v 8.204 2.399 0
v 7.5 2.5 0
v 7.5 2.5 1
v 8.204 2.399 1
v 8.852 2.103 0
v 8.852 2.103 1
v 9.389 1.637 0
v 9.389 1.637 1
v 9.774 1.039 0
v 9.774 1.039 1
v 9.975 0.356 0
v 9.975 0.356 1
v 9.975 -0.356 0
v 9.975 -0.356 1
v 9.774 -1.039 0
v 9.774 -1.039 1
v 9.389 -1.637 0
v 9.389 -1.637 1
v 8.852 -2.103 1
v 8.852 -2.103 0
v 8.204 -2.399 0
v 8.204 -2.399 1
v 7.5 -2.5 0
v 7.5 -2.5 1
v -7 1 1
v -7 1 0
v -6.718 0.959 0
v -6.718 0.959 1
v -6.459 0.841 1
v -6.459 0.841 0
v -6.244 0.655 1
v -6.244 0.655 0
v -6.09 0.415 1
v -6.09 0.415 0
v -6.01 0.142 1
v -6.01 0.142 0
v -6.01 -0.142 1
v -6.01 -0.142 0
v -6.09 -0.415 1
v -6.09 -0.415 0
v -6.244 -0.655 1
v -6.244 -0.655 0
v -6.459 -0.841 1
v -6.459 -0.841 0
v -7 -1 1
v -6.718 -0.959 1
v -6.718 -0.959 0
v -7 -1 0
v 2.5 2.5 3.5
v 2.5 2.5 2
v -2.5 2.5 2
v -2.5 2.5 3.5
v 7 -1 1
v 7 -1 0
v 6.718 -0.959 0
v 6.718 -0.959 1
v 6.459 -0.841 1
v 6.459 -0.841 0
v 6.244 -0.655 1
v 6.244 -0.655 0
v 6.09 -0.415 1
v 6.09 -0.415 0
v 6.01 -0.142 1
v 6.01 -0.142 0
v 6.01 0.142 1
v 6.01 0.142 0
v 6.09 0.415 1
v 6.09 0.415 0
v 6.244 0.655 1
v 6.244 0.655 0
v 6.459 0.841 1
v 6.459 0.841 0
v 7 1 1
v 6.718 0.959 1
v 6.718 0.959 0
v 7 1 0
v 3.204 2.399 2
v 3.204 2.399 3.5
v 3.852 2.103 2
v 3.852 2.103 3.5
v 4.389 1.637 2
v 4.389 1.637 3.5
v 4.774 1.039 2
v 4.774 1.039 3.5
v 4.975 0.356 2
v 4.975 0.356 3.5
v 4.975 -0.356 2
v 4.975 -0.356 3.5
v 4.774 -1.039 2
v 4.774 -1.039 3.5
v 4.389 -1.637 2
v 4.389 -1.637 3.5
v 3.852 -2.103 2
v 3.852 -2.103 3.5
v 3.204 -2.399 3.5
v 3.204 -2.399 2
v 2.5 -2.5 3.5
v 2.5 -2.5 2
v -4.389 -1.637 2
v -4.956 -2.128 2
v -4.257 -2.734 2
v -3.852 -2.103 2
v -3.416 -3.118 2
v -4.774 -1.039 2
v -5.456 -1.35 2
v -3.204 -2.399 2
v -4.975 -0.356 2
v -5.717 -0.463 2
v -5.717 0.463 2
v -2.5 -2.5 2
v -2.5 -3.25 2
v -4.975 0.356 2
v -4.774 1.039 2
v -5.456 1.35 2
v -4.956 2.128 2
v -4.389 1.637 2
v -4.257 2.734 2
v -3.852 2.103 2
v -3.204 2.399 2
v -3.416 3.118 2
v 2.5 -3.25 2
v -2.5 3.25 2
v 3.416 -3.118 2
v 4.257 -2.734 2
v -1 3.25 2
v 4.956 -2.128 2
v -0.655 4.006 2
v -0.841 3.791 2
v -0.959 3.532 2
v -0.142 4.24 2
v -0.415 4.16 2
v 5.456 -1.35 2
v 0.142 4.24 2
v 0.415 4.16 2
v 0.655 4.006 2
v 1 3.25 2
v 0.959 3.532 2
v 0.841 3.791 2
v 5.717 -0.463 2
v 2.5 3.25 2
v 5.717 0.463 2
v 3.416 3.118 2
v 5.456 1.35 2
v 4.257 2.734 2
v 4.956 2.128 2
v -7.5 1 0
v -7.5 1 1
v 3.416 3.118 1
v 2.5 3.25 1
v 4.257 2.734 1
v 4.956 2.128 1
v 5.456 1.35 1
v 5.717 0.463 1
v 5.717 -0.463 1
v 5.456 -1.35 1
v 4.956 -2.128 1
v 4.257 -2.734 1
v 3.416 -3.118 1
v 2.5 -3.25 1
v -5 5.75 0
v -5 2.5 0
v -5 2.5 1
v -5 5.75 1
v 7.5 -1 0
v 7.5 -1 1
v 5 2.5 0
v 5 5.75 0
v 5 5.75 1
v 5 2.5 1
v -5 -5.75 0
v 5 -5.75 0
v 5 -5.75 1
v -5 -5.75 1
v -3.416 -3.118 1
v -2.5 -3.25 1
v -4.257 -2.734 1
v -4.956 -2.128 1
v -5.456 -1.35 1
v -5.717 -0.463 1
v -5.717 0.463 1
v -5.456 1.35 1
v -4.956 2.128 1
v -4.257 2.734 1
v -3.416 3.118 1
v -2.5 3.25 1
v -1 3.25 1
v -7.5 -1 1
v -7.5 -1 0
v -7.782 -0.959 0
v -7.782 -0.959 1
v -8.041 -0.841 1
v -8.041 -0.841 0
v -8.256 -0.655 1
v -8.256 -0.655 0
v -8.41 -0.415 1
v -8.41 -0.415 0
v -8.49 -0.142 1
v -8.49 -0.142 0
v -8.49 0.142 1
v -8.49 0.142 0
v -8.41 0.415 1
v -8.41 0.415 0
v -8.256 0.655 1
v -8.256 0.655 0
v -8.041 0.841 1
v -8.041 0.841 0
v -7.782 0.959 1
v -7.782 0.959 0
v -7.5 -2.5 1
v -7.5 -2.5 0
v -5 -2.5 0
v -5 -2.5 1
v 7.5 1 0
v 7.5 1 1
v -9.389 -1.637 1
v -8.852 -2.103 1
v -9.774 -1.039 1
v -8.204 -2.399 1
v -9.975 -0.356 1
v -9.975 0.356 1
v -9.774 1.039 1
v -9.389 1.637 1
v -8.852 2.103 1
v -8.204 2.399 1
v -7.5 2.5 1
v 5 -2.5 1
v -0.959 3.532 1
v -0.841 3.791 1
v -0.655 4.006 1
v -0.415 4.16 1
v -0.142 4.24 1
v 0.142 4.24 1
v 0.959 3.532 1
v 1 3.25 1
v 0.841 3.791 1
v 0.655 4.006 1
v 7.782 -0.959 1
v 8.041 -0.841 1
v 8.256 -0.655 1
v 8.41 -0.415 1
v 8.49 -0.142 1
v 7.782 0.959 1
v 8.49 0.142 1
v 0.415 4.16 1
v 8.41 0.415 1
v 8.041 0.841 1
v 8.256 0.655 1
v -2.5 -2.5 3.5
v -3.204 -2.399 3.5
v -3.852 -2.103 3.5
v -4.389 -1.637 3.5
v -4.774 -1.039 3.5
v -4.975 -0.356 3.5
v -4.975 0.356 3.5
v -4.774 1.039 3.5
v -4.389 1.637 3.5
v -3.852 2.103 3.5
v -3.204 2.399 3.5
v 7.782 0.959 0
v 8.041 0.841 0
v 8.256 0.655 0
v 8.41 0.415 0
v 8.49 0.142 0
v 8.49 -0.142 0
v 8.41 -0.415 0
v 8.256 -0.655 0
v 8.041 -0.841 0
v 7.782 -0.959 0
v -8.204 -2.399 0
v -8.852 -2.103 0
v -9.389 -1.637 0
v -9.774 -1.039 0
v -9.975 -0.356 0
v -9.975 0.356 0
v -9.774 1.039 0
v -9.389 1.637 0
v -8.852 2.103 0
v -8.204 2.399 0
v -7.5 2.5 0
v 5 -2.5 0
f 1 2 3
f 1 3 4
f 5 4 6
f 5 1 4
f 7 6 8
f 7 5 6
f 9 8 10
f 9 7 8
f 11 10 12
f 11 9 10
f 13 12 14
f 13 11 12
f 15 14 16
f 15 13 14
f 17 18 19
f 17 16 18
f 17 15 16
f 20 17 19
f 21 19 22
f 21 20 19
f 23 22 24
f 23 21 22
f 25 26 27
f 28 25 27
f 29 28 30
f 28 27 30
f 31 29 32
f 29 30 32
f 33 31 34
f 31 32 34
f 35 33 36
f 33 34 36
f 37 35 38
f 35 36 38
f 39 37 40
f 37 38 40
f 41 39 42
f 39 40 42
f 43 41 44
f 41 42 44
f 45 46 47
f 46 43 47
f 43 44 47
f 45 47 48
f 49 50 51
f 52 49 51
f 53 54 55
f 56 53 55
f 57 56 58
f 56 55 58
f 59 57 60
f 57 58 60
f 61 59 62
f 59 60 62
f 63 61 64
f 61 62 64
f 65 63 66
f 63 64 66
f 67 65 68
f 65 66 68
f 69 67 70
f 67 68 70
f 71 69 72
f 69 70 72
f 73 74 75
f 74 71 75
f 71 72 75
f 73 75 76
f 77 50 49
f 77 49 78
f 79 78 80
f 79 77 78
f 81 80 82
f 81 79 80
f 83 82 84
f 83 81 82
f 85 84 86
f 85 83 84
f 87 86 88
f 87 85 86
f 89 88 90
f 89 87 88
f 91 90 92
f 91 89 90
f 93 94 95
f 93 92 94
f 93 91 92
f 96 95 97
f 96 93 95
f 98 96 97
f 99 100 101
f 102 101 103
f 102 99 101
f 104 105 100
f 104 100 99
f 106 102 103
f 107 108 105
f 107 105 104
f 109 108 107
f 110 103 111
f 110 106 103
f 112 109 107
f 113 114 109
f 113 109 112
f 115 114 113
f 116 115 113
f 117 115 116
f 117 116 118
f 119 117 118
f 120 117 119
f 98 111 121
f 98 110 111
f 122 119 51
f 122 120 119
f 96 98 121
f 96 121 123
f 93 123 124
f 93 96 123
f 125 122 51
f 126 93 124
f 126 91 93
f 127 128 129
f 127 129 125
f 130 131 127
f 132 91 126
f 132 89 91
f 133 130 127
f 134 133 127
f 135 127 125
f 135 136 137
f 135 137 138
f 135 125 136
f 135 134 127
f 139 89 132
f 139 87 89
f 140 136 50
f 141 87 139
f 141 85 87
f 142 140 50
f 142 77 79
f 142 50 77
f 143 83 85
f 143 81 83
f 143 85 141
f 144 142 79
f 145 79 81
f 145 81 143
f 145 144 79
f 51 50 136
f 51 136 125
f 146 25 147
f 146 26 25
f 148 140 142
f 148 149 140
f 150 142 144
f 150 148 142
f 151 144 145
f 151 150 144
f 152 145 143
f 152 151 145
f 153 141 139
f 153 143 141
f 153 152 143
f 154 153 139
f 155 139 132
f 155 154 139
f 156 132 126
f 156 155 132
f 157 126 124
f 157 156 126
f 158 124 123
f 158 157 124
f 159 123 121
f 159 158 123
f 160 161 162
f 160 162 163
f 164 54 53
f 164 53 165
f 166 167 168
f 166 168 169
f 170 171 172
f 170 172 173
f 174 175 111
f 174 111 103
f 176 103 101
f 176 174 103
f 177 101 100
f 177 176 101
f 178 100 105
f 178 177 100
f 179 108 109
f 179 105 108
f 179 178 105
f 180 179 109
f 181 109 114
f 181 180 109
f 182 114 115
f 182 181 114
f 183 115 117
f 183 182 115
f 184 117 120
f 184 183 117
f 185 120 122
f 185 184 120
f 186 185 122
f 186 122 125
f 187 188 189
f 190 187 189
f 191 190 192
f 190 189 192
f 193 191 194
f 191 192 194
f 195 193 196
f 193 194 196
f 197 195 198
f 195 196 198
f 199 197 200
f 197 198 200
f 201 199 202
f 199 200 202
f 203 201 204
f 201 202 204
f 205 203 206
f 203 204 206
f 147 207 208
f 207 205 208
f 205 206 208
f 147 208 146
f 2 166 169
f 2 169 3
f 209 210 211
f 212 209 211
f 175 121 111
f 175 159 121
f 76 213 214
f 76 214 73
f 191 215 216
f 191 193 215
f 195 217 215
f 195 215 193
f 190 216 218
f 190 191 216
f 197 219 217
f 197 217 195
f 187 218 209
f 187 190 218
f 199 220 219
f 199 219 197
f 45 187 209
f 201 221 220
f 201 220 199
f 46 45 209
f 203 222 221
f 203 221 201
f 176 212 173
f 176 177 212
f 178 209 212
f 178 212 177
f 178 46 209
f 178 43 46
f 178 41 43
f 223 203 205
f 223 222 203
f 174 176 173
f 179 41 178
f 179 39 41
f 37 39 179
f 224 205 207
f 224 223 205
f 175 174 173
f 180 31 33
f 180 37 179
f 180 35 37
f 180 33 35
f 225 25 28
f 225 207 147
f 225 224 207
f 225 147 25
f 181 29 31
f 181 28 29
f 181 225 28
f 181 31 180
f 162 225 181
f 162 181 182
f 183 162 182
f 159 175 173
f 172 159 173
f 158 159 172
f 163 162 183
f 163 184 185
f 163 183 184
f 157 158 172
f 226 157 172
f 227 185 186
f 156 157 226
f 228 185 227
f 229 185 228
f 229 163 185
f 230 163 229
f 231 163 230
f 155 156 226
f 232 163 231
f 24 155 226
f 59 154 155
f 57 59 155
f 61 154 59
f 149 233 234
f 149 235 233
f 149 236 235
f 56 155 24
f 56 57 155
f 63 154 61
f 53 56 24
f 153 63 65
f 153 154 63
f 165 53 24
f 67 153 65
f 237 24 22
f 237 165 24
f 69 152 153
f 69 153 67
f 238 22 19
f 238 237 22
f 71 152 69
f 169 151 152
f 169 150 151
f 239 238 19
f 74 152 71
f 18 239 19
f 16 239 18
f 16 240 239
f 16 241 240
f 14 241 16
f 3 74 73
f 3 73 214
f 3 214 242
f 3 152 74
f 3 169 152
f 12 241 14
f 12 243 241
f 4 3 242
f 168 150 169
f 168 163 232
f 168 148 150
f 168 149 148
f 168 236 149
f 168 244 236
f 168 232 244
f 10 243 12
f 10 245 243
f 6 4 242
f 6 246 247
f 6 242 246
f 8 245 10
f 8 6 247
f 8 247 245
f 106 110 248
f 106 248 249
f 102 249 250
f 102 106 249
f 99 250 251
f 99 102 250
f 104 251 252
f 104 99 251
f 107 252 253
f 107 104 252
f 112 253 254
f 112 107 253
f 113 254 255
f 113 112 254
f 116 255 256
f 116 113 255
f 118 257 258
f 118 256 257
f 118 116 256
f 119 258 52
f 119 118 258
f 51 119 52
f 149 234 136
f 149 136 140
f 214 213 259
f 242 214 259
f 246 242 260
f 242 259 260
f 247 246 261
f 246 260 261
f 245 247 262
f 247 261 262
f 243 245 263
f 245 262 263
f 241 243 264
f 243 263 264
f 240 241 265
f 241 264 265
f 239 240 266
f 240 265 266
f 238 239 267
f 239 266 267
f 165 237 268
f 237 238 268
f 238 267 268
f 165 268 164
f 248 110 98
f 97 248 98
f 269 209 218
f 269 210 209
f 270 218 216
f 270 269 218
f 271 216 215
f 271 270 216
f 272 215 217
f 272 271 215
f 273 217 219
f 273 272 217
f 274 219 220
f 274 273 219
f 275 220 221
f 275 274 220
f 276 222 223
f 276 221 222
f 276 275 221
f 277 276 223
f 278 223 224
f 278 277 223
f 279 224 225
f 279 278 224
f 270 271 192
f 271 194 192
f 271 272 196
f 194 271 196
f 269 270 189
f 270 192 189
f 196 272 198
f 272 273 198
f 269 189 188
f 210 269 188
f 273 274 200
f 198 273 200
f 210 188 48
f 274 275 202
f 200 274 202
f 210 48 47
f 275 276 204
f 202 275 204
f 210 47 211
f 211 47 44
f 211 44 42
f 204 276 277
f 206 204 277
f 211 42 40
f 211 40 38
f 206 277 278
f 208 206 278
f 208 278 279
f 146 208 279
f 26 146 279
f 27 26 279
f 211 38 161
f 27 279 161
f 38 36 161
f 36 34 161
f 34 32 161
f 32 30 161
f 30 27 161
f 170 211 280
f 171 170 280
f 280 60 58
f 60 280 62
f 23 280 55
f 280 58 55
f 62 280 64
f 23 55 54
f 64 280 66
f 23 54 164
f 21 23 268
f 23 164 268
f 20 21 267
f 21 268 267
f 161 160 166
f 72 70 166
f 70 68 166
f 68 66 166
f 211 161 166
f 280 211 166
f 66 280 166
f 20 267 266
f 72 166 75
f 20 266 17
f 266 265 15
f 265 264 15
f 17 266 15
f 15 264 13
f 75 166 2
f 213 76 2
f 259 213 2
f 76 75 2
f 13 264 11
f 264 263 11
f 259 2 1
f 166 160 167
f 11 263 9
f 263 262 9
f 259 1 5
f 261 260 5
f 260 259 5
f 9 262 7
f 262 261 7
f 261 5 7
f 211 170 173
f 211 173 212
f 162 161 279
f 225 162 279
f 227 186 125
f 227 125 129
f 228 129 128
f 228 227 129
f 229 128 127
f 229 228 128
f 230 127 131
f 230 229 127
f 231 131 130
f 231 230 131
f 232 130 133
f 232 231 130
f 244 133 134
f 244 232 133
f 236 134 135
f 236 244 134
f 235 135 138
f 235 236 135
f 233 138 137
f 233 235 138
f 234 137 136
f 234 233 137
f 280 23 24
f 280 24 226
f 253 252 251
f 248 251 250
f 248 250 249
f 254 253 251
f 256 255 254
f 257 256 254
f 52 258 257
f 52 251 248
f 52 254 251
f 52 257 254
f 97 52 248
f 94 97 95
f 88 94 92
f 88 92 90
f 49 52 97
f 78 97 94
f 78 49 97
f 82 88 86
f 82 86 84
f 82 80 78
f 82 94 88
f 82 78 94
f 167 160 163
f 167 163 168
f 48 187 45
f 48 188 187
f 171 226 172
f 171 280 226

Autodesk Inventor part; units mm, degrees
ref_plane "YZ Plane" through (0, 0, 0) normal (1, 0, 0) x (0, 1, 0)
ref_plane "XZ Plane" through (0, 0, 0) normal (0, 1, 0) x (-1, 0, 0)
ref_plane "XY Plane" through (0, 0, 0) normal (0, 0, 1) x (1, 0, 0)
sketch "Náčrt1" plane through (0, 0, 0) normal (0, 0, 1) x (1, 0, 0)
  line L0 (-5, 5.75) -> (5, 5.75)
  line L1 (5, -5.75) -> (-5, -5.75)
  line L2 (-5, 5.75) -> (5, -5.75) construction
  line L3 (5, 5.75) -> (-5, -5.75) construction
  line L4 (-5, 2.5) -> (-7.5, 2.5)
  arc A0 (-7.5, 2.5) -> (-7.5, -2.5) centre (-7.5, 0) ccw
  line L5 (-7.5, -2.5) -> (-5, -2.5)
  line L6 (5, 2.5) -> (7.5, 2.5)
  arc A1 (7.5, -2.5) -> (7.5, 2.5) centre (7.5, 0) ccw
  line L7 (7.5, -2.5) -> (5, -2.5)
  line L8 (-5, -5.75) -> (-5, -2.5)
  line L9 (-5, 2.5) -> (-5, 5.75)
  line L10 (5, 5.75) -> (5, 2.5)
  line L11 (5, -2.5) -> (5, -5.75)
  line L12 (-7.5, 0) -> (-7, 0) construction
  line L13 (-7.5, -1) -> (-7, -1)
  line L14 (-7, 1) -> (-7.5, 1)
  arc A2 (-7.5, 1) -> (-7.5, -1) centre (-7.5, 0) ccw
  arc A3 (-7, -1) -> (-7, 1) centre (-7, 0) ccw
  line L15 (7.5, 0) -> (7, 0) construction
  line L16 (7.5, 1) -> (7, 1)
  line L17 (7, -1) -> (7.5, -1)
  arc A4 (7.5, -1) -> (7.5, 1) centre (7.5, 0) ccw
  arc A5 (7, 1) -> (7, -1) centre (7, 0) ccw
  point P0 (0, 0)
  point P1 (-7.25, 0)
  point P2 (7.25, 0)
  point P3 (10, 0)
  point P4 (-10, 0)
  point P5 (-6, 0)
  point P6 (-8.5, 0)
  dimension "d0" = 11.5
  dimension "d1" = 10
  dimension "d2" = 5
  dimension "d3" = 2
  dimension "d4" = 20
  dimension "d5" = 2.5
extrude "Vysunutí1" add sketch "Náčrt1" along normal blind 1
sketch "Náčrt2" plane through (0, 0, 1) normal (0, 0, 1) x (1, 0, 0)
  line L0 (-2.5, 0) -> (2.5, 0) construction
  line L1 (2.5, -3.25) -> (-2.5, -3.25)
  arc A0 (-2.5, 3.25) -> (-2.5, -3.25) centre (-2.5, 0) ccw
  arc A1 (2.5, -3.25) -> (2.5, 3.25) centre (2.5, 0) ccw
  arc A2 (1, 3.25) -> (-1, 3.25) centre (0, 3.25) ccw
  line L2 (-2.5, 3.25) -> (-1, 3.25)
  line L3 (1, 3.25) -> (2.5, 3.25)
  point P0 (0, 0)
  point P1 (5.75, 0)
  point P2 (-5.75, 0)
  dimension "d8" = 6.5
  dimension "d9" = 11.5
  dimension "d10" = 1
extrude "Vysunutí2" add sketch "Náčrt2" along normal blind 1
sketch "Náčrt3" plane through (0, 0, 2) normal (0, 0, 1) x (1, 0, 0)
  arc A0 (-2.5, 3.25) -> (-2.5, -3.25) centre (-2.5, 0) ccw projected
  line L0 (-1, 3.25) -> (-2.5, 3.25) projected
  line L1 (2.5, 3.25) -> (1, 3.25) projected
  arc A1 (2.5, -3.25) -> (2.5, 3.25) centre (2.5, 0) ccw projected
  line L2 (-2.5, -3.25) -> (2.5, -3.25) projected
  line L3 (-1, 3.25) -> (1, 3.25)
  line L4 (2.5, 2.5) -> (1, 2.5)
  line L5 (1, 2.5) -> (-1, 2.5)
  line L6 (-1, 2.5) -> (-2.5, 2.5)
  arc A2 (-2.5, 2.5) -> (-2.5, -2.5) centre (-2.5, 0) ccw
  line L7 (-2.5, -2.5) -> (2.5, -2.5)
  arc A3 (2.5, -2.5) -> (2.5, 2.5) centre (2.5, 0) ccw
  point P0 (0, 0)
  dimension "d13" = 0.75
extrude "Vysunutí3" add sketch "Náčrt3" along normal blind 1.5 contours A3 L7 A2 L6 L5 L4
properties part number "TF-LC02 (Laser senzor)"
